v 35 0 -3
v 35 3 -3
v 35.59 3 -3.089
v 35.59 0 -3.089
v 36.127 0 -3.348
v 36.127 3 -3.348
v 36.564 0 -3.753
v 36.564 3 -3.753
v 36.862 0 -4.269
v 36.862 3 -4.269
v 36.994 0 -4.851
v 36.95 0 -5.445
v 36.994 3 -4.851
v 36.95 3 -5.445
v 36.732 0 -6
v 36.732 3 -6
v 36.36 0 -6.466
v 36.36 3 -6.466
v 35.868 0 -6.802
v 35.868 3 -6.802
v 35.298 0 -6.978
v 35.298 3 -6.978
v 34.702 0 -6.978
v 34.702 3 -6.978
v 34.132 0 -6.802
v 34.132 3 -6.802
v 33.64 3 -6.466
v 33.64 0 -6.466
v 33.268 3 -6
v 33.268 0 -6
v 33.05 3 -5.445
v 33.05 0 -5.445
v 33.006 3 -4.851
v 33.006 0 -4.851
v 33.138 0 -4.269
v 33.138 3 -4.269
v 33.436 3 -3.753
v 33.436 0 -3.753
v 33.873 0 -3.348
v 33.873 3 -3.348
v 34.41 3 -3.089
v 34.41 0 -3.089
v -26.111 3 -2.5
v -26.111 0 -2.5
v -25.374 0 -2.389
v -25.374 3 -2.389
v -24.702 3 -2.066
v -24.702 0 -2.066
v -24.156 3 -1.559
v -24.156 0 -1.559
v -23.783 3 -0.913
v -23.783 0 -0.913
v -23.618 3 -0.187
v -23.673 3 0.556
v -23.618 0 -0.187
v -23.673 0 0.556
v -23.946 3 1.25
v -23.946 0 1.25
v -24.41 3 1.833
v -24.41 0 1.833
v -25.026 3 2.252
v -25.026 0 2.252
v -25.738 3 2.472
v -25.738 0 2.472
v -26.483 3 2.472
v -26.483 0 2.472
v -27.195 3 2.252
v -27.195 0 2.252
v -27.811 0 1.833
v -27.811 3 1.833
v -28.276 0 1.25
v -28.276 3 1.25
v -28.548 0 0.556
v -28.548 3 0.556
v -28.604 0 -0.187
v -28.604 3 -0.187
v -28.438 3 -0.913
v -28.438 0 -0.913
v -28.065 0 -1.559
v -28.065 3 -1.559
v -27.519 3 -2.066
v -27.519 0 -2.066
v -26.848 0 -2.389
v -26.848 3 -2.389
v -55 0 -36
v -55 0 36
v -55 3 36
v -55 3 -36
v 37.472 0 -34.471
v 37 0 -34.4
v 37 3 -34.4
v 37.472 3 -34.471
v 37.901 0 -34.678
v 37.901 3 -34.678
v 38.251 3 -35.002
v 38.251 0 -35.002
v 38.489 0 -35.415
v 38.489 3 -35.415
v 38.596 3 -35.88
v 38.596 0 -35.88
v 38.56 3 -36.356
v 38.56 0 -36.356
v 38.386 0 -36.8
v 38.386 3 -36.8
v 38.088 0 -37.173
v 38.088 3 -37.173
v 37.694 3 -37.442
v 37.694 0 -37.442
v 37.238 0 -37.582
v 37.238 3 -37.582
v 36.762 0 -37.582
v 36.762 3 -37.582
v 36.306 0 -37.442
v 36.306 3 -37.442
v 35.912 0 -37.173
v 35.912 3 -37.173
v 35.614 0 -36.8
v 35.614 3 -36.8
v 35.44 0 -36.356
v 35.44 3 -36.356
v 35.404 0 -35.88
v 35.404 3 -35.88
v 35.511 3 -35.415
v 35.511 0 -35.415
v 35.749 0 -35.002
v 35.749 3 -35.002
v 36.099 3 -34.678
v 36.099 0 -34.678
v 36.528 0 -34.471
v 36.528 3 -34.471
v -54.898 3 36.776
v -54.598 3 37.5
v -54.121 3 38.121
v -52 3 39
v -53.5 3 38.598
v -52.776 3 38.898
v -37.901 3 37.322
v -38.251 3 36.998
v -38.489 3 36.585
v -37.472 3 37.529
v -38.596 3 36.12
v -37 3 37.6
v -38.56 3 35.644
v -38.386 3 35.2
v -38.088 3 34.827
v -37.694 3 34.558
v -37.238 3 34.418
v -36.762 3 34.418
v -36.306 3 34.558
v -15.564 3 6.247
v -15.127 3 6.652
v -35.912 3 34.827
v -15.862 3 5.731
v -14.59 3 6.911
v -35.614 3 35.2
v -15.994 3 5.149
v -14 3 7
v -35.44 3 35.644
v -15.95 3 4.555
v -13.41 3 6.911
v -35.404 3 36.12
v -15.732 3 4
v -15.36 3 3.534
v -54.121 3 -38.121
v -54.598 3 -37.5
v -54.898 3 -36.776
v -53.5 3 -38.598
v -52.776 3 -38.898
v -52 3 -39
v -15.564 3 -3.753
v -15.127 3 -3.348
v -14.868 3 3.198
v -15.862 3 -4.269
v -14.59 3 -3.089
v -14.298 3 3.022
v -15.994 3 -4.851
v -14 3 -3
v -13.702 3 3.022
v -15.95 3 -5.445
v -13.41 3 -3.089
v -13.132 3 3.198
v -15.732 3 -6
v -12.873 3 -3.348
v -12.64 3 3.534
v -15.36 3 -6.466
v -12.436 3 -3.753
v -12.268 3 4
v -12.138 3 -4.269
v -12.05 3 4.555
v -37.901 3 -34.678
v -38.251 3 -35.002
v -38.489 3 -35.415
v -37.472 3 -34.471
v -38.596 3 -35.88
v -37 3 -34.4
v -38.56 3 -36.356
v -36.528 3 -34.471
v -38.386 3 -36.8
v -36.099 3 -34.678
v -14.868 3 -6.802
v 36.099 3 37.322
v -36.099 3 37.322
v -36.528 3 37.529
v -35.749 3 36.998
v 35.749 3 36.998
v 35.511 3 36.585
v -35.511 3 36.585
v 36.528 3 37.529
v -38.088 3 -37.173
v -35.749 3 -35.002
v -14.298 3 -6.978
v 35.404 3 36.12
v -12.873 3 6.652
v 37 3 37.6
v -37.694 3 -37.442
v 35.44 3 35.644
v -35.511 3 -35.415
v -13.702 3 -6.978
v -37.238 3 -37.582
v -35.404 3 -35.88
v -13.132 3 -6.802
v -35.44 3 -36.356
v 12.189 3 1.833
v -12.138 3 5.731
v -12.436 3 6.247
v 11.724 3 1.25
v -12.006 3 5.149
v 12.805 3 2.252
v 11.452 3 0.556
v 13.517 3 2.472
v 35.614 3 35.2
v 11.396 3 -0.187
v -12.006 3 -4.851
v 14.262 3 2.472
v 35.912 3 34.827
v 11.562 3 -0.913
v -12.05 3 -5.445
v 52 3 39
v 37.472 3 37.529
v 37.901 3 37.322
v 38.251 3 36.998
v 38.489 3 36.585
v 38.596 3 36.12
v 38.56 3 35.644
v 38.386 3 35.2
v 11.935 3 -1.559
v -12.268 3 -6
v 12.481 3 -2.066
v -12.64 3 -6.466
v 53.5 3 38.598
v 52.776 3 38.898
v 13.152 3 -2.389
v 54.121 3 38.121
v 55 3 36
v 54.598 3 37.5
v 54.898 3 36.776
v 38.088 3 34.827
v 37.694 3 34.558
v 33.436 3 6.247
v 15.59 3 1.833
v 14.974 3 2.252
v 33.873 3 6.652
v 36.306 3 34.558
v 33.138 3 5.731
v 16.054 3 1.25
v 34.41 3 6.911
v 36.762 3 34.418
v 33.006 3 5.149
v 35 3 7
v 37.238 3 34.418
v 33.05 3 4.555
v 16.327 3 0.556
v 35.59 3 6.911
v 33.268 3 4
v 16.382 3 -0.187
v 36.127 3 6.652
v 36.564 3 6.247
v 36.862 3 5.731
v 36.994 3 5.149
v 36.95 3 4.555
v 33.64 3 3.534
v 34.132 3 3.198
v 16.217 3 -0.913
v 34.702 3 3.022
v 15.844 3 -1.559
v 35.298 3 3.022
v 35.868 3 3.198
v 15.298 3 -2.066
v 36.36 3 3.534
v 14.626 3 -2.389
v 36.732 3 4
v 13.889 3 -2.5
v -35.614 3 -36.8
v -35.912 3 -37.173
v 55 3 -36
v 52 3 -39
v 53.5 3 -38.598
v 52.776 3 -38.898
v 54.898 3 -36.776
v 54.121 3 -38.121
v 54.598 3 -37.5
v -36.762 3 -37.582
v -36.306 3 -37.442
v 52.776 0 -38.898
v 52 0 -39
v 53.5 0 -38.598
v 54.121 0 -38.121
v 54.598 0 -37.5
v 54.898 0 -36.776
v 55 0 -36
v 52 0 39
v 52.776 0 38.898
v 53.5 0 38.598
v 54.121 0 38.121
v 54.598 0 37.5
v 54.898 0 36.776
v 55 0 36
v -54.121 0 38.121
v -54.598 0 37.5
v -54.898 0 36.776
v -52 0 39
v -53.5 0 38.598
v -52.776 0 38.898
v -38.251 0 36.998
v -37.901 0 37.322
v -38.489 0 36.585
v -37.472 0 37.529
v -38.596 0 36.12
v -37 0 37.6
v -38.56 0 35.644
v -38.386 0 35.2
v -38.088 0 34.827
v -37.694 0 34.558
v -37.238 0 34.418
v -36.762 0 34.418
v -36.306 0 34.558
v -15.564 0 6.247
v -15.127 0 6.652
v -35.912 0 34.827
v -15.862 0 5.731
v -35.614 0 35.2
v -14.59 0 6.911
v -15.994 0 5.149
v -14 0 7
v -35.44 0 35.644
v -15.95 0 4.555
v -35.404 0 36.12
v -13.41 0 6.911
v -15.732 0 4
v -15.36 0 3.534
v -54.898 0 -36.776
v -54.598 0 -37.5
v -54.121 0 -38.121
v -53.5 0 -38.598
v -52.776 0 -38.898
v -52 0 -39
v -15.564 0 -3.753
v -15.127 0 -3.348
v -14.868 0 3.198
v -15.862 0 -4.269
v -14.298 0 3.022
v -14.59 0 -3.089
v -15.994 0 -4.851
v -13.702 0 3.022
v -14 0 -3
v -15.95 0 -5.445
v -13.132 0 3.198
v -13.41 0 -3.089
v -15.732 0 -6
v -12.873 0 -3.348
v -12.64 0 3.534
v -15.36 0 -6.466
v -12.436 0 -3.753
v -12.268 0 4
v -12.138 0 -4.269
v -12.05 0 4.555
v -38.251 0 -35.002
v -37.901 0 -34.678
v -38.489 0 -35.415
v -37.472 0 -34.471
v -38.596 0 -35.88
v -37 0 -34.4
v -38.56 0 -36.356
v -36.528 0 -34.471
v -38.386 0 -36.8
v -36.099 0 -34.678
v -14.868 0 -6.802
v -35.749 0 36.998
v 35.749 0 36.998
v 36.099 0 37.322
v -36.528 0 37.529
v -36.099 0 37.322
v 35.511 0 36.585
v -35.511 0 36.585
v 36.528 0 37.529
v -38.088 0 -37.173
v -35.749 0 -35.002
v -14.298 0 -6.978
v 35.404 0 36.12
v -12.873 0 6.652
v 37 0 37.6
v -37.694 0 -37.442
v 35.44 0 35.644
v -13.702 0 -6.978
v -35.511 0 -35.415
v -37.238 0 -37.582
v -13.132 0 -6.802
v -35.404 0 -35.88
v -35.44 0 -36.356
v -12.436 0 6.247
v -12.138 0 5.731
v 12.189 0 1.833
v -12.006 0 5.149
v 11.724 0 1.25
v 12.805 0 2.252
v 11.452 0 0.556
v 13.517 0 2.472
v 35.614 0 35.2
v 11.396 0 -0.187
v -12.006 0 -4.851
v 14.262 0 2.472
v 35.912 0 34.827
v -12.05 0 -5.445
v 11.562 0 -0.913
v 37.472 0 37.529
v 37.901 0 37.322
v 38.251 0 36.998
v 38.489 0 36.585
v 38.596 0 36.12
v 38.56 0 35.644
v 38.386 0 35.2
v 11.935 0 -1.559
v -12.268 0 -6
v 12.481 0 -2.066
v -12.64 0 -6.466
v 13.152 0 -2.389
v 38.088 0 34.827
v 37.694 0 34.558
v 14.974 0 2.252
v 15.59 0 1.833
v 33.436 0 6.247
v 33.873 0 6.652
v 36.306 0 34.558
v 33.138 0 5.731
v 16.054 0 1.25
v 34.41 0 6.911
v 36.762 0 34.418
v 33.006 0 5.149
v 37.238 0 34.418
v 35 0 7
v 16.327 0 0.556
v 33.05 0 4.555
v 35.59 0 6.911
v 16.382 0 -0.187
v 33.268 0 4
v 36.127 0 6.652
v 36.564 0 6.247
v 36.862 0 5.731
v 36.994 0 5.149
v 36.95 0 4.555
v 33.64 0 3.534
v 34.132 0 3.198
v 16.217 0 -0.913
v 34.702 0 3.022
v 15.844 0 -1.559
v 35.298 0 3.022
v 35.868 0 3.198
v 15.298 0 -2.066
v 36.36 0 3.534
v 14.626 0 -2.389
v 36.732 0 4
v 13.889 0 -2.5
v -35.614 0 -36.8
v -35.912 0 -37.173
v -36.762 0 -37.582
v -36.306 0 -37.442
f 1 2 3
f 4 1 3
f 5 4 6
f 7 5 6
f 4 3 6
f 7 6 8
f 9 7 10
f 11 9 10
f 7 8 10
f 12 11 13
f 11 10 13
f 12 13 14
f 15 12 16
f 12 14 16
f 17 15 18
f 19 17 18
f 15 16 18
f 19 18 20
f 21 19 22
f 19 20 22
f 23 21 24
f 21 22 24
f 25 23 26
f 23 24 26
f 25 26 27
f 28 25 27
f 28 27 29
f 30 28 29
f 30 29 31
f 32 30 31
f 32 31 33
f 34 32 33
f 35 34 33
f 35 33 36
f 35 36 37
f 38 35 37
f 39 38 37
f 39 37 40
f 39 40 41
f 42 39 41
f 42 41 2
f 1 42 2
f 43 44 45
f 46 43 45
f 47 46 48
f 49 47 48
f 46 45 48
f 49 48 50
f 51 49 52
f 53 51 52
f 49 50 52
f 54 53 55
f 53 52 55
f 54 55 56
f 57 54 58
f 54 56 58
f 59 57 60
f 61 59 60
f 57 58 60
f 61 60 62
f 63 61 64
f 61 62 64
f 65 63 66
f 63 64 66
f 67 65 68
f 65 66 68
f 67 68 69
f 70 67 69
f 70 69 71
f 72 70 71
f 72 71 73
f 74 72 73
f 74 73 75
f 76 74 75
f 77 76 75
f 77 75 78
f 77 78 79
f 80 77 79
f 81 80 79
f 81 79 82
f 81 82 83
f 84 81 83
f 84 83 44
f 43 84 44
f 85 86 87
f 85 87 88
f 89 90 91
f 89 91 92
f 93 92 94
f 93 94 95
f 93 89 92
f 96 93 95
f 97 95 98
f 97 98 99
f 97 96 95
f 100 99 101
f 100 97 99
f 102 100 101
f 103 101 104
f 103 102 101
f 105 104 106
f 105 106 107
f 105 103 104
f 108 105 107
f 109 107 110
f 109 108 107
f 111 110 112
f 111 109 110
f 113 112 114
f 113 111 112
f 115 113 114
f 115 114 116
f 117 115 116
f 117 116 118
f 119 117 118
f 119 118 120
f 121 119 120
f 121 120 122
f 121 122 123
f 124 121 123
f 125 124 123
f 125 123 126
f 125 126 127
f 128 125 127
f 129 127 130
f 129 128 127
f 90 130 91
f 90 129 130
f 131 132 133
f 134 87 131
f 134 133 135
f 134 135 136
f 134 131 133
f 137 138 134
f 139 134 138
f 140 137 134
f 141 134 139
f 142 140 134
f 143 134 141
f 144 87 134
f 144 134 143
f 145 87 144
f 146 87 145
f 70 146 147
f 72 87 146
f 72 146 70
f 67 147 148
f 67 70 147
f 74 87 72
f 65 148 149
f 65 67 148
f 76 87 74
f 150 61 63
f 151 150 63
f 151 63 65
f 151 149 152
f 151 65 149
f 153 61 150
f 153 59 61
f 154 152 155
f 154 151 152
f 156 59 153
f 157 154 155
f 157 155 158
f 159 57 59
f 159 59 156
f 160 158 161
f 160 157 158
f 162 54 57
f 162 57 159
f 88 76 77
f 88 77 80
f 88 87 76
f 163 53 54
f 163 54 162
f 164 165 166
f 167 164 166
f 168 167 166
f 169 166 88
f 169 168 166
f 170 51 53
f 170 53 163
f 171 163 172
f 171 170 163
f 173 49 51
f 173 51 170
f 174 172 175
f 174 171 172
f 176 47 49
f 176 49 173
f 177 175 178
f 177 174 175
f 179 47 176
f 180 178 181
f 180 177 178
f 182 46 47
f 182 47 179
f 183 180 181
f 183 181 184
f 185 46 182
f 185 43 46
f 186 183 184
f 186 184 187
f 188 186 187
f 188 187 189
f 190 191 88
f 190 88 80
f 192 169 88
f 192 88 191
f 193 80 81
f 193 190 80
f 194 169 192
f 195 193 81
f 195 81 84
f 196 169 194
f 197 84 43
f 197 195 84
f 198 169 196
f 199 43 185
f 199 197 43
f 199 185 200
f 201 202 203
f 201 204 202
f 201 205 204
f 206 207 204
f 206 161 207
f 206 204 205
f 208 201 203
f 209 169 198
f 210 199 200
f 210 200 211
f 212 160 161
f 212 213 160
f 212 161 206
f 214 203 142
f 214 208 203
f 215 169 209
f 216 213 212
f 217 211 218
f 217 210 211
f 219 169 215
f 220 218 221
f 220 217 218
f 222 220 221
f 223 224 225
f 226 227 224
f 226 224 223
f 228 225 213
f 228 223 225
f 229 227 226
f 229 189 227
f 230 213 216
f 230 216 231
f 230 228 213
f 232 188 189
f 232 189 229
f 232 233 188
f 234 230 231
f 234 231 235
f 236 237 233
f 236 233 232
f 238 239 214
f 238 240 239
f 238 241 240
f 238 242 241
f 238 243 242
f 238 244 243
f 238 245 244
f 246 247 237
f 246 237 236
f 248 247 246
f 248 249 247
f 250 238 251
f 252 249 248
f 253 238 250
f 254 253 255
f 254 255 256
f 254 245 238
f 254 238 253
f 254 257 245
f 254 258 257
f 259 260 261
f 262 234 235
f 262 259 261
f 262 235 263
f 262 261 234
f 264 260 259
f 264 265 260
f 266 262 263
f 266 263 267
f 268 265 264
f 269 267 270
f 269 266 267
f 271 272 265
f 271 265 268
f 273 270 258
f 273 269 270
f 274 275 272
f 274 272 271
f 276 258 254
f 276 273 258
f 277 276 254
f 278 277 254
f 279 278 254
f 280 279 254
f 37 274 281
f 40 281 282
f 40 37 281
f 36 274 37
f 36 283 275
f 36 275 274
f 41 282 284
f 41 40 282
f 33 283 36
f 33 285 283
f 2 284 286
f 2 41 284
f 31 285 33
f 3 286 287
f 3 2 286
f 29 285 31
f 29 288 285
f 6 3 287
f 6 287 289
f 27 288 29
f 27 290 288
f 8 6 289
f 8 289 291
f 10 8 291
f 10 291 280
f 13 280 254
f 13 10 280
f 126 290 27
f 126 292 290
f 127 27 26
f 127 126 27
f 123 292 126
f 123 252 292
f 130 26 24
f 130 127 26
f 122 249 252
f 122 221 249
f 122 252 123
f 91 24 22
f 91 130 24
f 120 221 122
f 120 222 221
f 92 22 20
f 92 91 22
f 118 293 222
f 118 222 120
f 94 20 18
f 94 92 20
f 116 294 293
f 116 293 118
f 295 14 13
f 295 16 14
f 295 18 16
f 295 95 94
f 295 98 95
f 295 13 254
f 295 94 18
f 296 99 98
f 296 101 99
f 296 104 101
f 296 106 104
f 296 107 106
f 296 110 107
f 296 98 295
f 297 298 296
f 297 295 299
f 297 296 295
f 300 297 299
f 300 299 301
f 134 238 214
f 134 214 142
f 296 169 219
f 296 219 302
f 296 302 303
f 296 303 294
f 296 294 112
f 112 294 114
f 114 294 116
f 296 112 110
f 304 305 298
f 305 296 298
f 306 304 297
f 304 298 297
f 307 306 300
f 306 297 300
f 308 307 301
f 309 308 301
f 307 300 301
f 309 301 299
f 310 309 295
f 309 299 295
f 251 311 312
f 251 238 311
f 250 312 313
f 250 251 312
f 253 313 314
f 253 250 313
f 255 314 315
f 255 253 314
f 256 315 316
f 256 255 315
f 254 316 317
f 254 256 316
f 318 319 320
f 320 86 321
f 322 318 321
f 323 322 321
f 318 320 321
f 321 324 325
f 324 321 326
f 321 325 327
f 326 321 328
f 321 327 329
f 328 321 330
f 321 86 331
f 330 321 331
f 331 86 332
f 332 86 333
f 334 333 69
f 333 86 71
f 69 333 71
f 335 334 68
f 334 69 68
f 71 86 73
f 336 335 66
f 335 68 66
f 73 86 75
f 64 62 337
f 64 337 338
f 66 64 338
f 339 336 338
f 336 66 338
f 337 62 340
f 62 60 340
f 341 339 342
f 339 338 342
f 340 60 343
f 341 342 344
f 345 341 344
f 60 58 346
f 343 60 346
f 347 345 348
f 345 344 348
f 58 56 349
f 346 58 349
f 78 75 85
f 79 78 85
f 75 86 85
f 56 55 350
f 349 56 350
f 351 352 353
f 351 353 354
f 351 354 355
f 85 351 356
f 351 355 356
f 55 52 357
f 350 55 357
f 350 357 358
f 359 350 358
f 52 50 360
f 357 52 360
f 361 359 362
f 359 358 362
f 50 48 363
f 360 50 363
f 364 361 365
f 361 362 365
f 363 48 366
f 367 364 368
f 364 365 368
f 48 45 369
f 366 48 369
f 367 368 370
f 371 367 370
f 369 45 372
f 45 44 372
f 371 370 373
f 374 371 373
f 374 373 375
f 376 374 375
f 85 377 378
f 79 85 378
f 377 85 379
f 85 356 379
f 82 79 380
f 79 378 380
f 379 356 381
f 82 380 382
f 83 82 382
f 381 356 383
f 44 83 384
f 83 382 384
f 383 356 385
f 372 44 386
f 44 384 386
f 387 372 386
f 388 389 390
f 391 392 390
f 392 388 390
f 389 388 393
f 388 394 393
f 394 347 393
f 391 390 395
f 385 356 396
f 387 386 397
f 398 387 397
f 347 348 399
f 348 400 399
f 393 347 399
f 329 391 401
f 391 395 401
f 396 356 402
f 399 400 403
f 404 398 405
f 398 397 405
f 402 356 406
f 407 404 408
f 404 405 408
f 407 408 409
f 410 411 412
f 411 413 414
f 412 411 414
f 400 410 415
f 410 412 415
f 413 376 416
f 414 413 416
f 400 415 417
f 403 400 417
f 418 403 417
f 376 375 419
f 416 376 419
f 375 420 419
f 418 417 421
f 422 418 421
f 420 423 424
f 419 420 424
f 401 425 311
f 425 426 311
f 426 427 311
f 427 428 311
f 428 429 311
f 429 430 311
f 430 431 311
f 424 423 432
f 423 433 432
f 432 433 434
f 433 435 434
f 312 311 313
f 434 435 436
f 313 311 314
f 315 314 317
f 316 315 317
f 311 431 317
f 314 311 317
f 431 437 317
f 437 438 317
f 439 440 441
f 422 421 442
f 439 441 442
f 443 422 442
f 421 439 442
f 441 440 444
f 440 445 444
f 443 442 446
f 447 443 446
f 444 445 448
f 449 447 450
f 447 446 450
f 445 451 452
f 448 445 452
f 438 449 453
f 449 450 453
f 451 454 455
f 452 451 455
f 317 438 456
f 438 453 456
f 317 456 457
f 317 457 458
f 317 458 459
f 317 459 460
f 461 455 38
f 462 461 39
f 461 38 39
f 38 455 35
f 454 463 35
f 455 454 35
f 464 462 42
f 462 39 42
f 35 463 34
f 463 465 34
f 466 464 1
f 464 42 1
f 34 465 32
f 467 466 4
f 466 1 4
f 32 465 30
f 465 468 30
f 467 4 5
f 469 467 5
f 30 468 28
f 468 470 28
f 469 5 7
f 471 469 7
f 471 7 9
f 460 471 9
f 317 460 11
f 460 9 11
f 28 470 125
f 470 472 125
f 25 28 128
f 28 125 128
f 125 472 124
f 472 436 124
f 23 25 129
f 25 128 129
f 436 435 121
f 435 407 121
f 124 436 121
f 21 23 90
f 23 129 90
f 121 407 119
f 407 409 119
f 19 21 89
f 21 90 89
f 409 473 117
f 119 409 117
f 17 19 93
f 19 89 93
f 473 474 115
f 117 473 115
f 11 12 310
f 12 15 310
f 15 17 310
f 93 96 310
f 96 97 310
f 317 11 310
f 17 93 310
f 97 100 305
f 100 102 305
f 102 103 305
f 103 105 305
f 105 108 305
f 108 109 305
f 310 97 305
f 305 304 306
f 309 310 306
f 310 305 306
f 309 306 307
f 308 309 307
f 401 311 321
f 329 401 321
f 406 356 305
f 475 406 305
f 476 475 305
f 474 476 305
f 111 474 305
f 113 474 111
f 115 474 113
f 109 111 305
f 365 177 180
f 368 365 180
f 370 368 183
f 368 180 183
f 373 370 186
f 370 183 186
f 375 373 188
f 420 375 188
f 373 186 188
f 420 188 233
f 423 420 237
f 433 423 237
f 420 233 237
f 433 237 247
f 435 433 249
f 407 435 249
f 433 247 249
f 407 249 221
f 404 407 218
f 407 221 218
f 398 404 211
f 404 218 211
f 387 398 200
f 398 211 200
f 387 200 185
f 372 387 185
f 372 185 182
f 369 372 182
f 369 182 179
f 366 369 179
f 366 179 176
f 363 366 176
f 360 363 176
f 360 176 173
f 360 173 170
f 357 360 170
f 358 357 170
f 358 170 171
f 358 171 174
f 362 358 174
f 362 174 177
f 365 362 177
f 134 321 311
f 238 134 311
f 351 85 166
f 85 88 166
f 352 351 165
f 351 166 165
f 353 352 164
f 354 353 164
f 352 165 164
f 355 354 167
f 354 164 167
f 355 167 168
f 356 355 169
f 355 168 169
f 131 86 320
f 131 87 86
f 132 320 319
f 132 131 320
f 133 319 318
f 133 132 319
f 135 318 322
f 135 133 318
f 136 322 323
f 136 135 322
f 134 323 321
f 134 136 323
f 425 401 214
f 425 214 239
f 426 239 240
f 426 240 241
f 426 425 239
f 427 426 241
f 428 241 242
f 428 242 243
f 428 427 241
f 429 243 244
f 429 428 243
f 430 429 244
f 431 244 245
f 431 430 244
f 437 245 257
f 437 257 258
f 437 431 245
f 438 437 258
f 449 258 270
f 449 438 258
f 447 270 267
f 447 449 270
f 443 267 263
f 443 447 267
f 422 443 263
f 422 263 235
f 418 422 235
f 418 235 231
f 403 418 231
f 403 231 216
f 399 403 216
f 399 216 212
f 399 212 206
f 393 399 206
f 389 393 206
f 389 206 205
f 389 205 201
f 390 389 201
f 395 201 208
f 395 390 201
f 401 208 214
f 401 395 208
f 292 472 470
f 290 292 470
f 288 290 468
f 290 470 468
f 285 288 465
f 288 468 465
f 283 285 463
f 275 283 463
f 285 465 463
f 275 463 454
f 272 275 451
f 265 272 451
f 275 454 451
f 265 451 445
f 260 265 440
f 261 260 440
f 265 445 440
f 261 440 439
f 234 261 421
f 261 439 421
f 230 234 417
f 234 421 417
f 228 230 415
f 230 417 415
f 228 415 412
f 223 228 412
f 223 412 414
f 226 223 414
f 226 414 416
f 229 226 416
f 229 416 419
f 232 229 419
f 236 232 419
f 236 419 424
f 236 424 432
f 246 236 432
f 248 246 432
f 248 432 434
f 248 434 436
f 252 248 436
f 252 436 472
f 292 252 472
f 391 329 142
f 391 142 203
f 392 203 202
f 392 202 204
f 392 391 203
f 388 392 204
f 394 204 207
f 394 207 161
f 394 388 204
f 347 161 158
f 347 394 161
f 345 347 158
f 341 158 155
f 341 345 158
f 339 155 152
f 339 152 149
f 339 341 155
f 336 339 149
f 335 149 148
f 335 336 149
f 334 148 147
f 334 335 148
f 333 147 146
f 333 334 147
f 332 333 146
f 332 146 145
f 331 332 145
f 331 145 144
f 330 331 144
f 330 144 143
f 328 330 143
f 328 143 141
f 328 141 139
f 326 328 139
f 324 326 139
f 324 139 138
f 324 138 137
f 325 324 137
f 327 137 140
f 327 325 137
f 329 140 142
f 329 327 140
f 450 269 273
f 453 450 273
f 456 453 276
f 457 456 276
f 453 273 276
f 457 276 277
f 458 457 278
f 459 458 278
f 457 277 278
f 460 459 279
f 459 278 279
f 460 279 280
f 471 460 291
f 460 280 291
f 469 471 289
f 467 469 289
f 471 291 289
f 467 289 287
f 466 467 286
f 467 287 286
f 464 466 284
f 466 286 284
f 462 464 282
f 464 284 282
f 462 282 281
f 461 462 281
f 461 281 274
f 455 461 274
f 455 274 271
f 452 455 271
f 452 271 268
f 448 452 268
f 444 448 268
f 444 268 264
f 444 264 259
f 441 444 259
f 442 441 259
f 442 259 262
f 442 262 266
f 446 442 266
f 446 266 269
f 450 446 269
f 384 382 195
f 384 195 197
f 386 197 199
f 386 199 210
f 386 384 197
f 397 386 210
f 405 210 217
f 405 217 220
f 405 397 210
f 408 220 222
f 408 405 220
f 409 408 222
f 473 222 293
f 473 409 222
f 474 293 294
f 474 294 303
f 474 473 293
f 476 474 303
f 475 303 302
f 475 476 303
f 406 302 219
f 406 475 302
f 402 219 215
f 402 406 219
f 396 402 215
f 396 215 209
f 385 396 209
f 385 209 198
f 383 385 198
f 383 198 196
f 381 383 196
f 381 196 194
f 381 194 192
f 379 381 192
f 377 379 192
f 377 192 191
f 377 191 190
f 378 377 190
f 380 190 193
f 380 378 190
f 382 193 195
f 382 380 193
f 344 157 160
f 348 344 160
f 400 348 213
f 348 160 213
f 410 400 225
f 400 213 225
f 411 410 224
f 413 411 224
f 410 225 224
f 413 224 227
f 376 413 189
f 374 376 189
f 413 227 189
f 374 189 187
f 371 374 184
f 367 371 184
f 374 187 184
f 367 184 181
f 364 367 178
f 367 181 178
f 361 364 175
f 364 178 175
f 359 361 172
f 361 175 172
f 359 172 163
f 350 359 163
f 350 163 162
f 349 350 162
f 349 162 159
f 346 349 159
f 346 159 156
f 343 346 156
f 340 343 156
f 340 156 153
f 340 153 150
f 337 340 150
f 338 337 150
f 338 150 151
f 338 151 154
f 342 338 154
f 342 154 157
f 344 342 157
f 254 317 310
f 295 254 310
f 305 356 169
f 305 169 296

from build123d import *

# Parameters (mm, degrees)
SKETCH_1_W          = 110
SKETCH_1_H          = 78
SKETCH_1_R          = 1.6
EXTRUDE_1_DEPTH     = 3
FILLET_1_R          = 3
SKETCH_2_R          = 2
CUT_EXTRUDE_1_DEPTH = 10
SKETCH_3_R          = 2.5
CUT_EXTRUDE_2_DEPTH = 10


with BuildPart() as part:
    # 草图1 → 凸台-拉伸1 (new body)
    with BuildSketch(Plane(origin=(0, 0, 0), x_dir=(1, 0, 0), z_dir=(0, 1, 0))):
        Rectangle(SKETCH_1_W, SKETCH_1_H)
        with Locations(Location((-37, 36, 0), (0, 0, 270))):
            Circle(SKETCH_1_R, mode=Mode.SUBTRACT)
        with Locations(Location((37, 36, 0), (0, 0, 270))):
            Circle(SKETCH_1_R, mode=Mode.SUBTRACT)
        with Locations(Location((37, -36, 0), (0, 0, 270))):
            Circle(SKETCH_1_R, mode=Mode.SUBTRACT)
        with Locations(Location((-37, -36, 0), (0, 0, 270))):
            Circle(SKETCH_1_R, mode=Mode.SUBTRACT)
    extrude(amount=EXTRUDE_1_DEPTH)

    # 圆角1
    fillet_1_edges = [part.edges().sort_by_distance(p)[0] for p in [
        (-55, 1.5, -39),
        (55, 1.5, -39),
        (55, 1.5, 39),
        (-55, 1.5, 39),
    ]]
    fillet(fillet_1_edges, radius=FILLET_1_R)

    # 草图2 → 切除-拉伸1 (cut)
    with BuildSketch(Plane(origin=(0, 3, 0), x_dir=(1, 0, 0), z_dir=(0, 1, 0))):
        with Locations(Location((-14, 5, 0), (0, 0, 270))):
            Circle(SKETCH_2_R)
        with Locations(Location((35, 5, 0), (0, 0, 270))):
            Circle(SKETCH_2_R)
        with Locations(Location((35, -5, 0), (0, 0, 270))):
            Circle(SKETCH_2_R)
        with Locations(Location((-14, -5, 0), (0, 0, 270))):
            Circle(SKETCH_2_R)
    extrude(amount=-CUT_EXTRUDE_1_DEPTH, mode=Mode.SUBTRACT)

    # 草图3 → 切除-拉伸2 (cut)
    with BuildSketch(Plane.XZ):
        with Locations(Location((-26.110622524, 0, 0), (0, 0, 270))):
            Circle(SKETCH_3_R)
        with Locations(Location((13.889377476, 0, 0), (0, 0, 270))):
            Circle(SKETCH_3_R)
    extrude(amount=-CUT_EXTRUDE_2_DEPTH, mode=Mode.SUBTRACT)


solid = part.part
